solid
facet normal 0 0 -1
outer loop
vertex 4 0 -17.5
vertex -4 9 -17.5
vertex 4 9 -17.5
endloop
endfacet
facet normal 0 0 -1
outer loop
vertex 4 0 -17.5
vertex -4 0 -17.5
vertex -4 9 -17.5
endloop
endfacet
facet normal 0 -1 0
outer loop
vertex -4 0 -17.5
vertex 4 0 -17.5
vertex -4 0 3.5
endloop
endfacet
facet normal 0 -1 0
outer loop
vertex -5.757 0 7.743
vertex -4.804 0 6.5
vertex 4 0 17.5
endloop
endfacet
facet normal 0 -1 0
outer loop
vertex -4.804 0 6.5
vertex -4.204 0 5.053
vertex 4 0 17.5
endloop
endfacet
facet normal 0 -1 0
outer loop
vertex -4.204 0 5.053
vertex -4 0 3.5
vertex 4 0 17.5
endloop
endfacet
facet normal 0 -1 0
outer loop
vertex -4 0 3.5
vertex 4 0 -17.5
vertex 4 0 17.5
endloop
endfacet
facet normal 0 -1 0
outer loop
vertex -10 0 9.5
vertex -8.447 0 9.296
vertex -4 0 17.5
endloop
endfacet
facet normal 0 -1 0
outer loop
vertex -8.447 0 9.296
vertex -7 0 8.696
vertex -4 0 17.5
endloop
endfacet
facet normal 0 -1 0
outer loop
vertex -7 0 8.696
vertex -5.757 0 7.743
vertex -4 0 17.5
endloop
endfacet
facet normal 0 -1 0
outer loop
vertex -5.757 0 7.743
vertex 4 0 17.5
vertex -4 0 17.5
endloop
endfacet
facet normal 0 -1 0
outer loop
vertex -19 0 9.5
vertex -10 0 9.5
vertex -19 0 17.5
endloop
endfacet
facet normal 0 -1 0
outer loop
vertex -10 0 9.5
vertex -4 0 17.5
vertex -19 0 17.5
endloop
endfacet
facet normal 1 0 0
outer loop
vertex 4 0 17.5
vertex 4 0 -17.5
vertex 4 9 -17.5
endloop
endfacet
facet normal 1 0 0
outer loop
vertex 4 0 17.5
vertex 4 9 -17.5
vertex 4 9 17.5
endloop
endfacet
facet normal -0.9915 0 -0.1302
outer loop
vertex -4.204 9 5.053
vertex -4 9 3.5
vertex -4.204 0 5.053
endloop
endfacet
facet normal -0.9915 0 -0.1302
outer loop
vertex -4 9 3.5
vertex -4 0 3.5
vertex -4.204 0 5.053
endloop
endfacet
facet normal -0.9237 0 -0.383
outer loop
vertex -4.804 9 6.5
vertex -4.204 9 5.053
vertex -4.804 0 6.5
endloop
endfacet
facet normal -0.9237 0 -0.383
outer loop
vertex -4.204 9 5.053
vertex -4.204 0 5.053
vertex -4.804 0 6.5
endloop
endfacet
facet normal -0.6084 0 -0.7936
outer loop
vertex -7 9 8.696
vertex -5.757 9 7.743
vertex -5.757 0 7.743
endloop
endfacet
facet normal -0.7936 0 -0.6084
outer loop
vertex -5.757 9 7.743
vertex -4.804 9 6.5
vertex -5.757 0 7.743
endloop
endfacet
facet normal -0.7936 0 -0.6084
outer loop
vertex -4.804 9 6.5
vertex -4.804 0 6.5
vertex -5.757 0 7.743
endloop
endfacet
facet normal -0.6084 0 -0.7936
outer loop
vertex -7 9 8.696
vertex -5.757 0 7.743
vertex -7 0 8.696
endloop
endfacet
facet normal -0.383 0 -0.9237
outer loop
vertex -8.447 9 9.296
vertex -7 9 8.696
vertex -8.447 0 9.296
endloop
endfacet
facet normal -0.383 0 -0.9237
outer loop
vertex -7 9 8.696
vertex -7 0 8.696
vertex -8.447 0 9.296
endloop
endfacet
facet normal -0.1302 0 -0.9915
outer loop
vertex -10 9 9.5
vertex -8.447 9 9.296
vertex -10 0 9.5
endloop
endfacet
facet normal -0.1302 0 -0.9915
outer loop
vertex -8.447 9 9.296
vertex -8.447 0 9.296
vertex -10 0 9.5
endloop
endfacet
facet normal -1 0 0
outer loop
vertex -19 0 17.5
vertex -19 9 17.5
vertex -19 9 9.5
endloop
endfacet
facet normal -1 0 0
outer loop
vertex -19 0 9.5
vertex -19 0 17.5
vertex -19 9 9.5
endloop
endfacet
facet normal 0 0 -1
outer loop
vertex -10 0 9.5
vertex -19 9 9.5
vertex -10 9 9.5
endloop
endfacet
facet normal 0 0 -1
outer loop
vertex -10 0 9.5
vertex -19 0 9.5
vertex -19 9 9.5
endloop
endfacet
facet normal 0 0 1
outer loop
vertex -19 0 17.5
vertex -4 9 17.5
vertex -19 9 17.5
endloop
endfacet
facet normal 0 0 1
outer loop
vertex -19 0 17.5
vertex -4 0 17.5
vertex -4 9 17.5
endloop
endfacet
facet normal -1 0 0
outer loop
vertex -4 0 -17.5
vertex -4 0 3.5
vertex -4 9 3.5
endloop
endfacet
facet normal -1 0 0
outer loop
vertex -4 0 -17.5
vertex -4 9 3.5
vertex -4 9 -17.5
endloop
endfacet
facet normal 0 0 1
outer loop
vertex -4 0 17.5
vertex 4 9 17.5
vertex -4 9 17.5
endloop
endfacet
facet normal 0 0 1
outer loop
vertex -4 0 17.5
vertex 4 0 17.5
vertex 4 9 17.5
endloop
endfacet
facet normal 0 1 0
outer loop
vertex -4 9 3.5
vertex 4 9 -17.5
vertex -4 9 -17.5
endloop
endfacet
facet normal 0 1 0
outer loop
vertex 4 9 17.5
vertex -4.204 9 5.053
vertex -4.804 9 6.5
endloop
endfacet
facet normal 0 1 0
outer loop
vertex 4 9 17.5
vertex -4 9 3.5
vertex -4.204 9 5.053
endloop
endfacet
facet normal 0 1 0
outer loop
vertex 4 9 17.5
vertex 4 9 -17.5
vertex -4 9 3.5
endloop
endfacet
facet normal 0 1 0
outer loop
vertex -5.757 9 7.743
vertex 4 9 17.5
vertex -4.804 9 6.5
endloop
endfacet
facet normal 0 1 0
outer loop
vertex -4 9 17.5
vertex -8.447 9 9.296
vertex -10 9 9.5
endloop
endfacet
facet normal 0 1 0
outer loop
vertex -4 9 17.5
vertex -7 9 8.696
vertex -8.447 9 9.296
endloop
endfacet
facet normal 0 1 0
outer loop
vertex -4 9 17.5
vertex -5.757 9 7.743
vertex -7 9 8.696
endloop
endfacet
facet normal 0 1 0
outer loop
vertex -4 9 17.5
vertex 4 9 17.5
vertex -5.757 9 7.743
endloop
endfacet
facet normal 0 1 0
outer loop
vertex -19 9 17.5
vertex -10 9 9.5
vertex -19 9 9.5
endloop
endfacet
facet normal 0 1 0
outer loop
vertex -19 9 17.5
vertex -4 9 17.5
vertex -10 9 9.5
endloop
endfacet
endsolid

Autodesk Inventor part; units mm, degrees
ref_plane "YZ Plane" through (0, 0, 0) normal (1, 0, 0) x (0, 1, 0)
ref_plane "XZ Plane" through (0, 0, 0) normal (0, 1, 0) x (-1, 0, 0)
ref_plane "XY Plane" through (0, 0, 0) normal (0, 0, 1) x (1, 0, 0)
sketch "Эскиз1" plane through (0, 0, 0) normal (0, 1, 0) x (-1, 0, 0)
  line L0 (-4, 17.5) -> (4, 17.5)
  line L1 (4, 3.5) -> (4, -17.5)
  line L2 (4, -17.5) -> (-4, -17.5)
  line L3 (-4, -17.5) -> (-4, 17.5)
  line L4 (-4, 17.5) -> (4, -17.5) construction
  line L5 (4, 17.5) -> (-4, -17.5) construction
  line L6 (4, 17.5) -> (19, 17.5)
  line L7 (19, 17.5) -> (19, 9.5)
  line L8 (19, 9.5) -> (10, 9.5)
  arc A0 (10, 9.5) -> (4, 3.5) centre (10, 3.5) ccw
  point P0 (0, 0)
  point P1 (4, 9.5)
  dimension "d0" = 8
  dimension "d2" = 15
  dimension "d3" = 8
  dimension "d4" = 35
  dimension "d5" = 6
extrude "Выдавливание1" add sketch "Эскиз1" along normal blind 9
properties part number "angle"
